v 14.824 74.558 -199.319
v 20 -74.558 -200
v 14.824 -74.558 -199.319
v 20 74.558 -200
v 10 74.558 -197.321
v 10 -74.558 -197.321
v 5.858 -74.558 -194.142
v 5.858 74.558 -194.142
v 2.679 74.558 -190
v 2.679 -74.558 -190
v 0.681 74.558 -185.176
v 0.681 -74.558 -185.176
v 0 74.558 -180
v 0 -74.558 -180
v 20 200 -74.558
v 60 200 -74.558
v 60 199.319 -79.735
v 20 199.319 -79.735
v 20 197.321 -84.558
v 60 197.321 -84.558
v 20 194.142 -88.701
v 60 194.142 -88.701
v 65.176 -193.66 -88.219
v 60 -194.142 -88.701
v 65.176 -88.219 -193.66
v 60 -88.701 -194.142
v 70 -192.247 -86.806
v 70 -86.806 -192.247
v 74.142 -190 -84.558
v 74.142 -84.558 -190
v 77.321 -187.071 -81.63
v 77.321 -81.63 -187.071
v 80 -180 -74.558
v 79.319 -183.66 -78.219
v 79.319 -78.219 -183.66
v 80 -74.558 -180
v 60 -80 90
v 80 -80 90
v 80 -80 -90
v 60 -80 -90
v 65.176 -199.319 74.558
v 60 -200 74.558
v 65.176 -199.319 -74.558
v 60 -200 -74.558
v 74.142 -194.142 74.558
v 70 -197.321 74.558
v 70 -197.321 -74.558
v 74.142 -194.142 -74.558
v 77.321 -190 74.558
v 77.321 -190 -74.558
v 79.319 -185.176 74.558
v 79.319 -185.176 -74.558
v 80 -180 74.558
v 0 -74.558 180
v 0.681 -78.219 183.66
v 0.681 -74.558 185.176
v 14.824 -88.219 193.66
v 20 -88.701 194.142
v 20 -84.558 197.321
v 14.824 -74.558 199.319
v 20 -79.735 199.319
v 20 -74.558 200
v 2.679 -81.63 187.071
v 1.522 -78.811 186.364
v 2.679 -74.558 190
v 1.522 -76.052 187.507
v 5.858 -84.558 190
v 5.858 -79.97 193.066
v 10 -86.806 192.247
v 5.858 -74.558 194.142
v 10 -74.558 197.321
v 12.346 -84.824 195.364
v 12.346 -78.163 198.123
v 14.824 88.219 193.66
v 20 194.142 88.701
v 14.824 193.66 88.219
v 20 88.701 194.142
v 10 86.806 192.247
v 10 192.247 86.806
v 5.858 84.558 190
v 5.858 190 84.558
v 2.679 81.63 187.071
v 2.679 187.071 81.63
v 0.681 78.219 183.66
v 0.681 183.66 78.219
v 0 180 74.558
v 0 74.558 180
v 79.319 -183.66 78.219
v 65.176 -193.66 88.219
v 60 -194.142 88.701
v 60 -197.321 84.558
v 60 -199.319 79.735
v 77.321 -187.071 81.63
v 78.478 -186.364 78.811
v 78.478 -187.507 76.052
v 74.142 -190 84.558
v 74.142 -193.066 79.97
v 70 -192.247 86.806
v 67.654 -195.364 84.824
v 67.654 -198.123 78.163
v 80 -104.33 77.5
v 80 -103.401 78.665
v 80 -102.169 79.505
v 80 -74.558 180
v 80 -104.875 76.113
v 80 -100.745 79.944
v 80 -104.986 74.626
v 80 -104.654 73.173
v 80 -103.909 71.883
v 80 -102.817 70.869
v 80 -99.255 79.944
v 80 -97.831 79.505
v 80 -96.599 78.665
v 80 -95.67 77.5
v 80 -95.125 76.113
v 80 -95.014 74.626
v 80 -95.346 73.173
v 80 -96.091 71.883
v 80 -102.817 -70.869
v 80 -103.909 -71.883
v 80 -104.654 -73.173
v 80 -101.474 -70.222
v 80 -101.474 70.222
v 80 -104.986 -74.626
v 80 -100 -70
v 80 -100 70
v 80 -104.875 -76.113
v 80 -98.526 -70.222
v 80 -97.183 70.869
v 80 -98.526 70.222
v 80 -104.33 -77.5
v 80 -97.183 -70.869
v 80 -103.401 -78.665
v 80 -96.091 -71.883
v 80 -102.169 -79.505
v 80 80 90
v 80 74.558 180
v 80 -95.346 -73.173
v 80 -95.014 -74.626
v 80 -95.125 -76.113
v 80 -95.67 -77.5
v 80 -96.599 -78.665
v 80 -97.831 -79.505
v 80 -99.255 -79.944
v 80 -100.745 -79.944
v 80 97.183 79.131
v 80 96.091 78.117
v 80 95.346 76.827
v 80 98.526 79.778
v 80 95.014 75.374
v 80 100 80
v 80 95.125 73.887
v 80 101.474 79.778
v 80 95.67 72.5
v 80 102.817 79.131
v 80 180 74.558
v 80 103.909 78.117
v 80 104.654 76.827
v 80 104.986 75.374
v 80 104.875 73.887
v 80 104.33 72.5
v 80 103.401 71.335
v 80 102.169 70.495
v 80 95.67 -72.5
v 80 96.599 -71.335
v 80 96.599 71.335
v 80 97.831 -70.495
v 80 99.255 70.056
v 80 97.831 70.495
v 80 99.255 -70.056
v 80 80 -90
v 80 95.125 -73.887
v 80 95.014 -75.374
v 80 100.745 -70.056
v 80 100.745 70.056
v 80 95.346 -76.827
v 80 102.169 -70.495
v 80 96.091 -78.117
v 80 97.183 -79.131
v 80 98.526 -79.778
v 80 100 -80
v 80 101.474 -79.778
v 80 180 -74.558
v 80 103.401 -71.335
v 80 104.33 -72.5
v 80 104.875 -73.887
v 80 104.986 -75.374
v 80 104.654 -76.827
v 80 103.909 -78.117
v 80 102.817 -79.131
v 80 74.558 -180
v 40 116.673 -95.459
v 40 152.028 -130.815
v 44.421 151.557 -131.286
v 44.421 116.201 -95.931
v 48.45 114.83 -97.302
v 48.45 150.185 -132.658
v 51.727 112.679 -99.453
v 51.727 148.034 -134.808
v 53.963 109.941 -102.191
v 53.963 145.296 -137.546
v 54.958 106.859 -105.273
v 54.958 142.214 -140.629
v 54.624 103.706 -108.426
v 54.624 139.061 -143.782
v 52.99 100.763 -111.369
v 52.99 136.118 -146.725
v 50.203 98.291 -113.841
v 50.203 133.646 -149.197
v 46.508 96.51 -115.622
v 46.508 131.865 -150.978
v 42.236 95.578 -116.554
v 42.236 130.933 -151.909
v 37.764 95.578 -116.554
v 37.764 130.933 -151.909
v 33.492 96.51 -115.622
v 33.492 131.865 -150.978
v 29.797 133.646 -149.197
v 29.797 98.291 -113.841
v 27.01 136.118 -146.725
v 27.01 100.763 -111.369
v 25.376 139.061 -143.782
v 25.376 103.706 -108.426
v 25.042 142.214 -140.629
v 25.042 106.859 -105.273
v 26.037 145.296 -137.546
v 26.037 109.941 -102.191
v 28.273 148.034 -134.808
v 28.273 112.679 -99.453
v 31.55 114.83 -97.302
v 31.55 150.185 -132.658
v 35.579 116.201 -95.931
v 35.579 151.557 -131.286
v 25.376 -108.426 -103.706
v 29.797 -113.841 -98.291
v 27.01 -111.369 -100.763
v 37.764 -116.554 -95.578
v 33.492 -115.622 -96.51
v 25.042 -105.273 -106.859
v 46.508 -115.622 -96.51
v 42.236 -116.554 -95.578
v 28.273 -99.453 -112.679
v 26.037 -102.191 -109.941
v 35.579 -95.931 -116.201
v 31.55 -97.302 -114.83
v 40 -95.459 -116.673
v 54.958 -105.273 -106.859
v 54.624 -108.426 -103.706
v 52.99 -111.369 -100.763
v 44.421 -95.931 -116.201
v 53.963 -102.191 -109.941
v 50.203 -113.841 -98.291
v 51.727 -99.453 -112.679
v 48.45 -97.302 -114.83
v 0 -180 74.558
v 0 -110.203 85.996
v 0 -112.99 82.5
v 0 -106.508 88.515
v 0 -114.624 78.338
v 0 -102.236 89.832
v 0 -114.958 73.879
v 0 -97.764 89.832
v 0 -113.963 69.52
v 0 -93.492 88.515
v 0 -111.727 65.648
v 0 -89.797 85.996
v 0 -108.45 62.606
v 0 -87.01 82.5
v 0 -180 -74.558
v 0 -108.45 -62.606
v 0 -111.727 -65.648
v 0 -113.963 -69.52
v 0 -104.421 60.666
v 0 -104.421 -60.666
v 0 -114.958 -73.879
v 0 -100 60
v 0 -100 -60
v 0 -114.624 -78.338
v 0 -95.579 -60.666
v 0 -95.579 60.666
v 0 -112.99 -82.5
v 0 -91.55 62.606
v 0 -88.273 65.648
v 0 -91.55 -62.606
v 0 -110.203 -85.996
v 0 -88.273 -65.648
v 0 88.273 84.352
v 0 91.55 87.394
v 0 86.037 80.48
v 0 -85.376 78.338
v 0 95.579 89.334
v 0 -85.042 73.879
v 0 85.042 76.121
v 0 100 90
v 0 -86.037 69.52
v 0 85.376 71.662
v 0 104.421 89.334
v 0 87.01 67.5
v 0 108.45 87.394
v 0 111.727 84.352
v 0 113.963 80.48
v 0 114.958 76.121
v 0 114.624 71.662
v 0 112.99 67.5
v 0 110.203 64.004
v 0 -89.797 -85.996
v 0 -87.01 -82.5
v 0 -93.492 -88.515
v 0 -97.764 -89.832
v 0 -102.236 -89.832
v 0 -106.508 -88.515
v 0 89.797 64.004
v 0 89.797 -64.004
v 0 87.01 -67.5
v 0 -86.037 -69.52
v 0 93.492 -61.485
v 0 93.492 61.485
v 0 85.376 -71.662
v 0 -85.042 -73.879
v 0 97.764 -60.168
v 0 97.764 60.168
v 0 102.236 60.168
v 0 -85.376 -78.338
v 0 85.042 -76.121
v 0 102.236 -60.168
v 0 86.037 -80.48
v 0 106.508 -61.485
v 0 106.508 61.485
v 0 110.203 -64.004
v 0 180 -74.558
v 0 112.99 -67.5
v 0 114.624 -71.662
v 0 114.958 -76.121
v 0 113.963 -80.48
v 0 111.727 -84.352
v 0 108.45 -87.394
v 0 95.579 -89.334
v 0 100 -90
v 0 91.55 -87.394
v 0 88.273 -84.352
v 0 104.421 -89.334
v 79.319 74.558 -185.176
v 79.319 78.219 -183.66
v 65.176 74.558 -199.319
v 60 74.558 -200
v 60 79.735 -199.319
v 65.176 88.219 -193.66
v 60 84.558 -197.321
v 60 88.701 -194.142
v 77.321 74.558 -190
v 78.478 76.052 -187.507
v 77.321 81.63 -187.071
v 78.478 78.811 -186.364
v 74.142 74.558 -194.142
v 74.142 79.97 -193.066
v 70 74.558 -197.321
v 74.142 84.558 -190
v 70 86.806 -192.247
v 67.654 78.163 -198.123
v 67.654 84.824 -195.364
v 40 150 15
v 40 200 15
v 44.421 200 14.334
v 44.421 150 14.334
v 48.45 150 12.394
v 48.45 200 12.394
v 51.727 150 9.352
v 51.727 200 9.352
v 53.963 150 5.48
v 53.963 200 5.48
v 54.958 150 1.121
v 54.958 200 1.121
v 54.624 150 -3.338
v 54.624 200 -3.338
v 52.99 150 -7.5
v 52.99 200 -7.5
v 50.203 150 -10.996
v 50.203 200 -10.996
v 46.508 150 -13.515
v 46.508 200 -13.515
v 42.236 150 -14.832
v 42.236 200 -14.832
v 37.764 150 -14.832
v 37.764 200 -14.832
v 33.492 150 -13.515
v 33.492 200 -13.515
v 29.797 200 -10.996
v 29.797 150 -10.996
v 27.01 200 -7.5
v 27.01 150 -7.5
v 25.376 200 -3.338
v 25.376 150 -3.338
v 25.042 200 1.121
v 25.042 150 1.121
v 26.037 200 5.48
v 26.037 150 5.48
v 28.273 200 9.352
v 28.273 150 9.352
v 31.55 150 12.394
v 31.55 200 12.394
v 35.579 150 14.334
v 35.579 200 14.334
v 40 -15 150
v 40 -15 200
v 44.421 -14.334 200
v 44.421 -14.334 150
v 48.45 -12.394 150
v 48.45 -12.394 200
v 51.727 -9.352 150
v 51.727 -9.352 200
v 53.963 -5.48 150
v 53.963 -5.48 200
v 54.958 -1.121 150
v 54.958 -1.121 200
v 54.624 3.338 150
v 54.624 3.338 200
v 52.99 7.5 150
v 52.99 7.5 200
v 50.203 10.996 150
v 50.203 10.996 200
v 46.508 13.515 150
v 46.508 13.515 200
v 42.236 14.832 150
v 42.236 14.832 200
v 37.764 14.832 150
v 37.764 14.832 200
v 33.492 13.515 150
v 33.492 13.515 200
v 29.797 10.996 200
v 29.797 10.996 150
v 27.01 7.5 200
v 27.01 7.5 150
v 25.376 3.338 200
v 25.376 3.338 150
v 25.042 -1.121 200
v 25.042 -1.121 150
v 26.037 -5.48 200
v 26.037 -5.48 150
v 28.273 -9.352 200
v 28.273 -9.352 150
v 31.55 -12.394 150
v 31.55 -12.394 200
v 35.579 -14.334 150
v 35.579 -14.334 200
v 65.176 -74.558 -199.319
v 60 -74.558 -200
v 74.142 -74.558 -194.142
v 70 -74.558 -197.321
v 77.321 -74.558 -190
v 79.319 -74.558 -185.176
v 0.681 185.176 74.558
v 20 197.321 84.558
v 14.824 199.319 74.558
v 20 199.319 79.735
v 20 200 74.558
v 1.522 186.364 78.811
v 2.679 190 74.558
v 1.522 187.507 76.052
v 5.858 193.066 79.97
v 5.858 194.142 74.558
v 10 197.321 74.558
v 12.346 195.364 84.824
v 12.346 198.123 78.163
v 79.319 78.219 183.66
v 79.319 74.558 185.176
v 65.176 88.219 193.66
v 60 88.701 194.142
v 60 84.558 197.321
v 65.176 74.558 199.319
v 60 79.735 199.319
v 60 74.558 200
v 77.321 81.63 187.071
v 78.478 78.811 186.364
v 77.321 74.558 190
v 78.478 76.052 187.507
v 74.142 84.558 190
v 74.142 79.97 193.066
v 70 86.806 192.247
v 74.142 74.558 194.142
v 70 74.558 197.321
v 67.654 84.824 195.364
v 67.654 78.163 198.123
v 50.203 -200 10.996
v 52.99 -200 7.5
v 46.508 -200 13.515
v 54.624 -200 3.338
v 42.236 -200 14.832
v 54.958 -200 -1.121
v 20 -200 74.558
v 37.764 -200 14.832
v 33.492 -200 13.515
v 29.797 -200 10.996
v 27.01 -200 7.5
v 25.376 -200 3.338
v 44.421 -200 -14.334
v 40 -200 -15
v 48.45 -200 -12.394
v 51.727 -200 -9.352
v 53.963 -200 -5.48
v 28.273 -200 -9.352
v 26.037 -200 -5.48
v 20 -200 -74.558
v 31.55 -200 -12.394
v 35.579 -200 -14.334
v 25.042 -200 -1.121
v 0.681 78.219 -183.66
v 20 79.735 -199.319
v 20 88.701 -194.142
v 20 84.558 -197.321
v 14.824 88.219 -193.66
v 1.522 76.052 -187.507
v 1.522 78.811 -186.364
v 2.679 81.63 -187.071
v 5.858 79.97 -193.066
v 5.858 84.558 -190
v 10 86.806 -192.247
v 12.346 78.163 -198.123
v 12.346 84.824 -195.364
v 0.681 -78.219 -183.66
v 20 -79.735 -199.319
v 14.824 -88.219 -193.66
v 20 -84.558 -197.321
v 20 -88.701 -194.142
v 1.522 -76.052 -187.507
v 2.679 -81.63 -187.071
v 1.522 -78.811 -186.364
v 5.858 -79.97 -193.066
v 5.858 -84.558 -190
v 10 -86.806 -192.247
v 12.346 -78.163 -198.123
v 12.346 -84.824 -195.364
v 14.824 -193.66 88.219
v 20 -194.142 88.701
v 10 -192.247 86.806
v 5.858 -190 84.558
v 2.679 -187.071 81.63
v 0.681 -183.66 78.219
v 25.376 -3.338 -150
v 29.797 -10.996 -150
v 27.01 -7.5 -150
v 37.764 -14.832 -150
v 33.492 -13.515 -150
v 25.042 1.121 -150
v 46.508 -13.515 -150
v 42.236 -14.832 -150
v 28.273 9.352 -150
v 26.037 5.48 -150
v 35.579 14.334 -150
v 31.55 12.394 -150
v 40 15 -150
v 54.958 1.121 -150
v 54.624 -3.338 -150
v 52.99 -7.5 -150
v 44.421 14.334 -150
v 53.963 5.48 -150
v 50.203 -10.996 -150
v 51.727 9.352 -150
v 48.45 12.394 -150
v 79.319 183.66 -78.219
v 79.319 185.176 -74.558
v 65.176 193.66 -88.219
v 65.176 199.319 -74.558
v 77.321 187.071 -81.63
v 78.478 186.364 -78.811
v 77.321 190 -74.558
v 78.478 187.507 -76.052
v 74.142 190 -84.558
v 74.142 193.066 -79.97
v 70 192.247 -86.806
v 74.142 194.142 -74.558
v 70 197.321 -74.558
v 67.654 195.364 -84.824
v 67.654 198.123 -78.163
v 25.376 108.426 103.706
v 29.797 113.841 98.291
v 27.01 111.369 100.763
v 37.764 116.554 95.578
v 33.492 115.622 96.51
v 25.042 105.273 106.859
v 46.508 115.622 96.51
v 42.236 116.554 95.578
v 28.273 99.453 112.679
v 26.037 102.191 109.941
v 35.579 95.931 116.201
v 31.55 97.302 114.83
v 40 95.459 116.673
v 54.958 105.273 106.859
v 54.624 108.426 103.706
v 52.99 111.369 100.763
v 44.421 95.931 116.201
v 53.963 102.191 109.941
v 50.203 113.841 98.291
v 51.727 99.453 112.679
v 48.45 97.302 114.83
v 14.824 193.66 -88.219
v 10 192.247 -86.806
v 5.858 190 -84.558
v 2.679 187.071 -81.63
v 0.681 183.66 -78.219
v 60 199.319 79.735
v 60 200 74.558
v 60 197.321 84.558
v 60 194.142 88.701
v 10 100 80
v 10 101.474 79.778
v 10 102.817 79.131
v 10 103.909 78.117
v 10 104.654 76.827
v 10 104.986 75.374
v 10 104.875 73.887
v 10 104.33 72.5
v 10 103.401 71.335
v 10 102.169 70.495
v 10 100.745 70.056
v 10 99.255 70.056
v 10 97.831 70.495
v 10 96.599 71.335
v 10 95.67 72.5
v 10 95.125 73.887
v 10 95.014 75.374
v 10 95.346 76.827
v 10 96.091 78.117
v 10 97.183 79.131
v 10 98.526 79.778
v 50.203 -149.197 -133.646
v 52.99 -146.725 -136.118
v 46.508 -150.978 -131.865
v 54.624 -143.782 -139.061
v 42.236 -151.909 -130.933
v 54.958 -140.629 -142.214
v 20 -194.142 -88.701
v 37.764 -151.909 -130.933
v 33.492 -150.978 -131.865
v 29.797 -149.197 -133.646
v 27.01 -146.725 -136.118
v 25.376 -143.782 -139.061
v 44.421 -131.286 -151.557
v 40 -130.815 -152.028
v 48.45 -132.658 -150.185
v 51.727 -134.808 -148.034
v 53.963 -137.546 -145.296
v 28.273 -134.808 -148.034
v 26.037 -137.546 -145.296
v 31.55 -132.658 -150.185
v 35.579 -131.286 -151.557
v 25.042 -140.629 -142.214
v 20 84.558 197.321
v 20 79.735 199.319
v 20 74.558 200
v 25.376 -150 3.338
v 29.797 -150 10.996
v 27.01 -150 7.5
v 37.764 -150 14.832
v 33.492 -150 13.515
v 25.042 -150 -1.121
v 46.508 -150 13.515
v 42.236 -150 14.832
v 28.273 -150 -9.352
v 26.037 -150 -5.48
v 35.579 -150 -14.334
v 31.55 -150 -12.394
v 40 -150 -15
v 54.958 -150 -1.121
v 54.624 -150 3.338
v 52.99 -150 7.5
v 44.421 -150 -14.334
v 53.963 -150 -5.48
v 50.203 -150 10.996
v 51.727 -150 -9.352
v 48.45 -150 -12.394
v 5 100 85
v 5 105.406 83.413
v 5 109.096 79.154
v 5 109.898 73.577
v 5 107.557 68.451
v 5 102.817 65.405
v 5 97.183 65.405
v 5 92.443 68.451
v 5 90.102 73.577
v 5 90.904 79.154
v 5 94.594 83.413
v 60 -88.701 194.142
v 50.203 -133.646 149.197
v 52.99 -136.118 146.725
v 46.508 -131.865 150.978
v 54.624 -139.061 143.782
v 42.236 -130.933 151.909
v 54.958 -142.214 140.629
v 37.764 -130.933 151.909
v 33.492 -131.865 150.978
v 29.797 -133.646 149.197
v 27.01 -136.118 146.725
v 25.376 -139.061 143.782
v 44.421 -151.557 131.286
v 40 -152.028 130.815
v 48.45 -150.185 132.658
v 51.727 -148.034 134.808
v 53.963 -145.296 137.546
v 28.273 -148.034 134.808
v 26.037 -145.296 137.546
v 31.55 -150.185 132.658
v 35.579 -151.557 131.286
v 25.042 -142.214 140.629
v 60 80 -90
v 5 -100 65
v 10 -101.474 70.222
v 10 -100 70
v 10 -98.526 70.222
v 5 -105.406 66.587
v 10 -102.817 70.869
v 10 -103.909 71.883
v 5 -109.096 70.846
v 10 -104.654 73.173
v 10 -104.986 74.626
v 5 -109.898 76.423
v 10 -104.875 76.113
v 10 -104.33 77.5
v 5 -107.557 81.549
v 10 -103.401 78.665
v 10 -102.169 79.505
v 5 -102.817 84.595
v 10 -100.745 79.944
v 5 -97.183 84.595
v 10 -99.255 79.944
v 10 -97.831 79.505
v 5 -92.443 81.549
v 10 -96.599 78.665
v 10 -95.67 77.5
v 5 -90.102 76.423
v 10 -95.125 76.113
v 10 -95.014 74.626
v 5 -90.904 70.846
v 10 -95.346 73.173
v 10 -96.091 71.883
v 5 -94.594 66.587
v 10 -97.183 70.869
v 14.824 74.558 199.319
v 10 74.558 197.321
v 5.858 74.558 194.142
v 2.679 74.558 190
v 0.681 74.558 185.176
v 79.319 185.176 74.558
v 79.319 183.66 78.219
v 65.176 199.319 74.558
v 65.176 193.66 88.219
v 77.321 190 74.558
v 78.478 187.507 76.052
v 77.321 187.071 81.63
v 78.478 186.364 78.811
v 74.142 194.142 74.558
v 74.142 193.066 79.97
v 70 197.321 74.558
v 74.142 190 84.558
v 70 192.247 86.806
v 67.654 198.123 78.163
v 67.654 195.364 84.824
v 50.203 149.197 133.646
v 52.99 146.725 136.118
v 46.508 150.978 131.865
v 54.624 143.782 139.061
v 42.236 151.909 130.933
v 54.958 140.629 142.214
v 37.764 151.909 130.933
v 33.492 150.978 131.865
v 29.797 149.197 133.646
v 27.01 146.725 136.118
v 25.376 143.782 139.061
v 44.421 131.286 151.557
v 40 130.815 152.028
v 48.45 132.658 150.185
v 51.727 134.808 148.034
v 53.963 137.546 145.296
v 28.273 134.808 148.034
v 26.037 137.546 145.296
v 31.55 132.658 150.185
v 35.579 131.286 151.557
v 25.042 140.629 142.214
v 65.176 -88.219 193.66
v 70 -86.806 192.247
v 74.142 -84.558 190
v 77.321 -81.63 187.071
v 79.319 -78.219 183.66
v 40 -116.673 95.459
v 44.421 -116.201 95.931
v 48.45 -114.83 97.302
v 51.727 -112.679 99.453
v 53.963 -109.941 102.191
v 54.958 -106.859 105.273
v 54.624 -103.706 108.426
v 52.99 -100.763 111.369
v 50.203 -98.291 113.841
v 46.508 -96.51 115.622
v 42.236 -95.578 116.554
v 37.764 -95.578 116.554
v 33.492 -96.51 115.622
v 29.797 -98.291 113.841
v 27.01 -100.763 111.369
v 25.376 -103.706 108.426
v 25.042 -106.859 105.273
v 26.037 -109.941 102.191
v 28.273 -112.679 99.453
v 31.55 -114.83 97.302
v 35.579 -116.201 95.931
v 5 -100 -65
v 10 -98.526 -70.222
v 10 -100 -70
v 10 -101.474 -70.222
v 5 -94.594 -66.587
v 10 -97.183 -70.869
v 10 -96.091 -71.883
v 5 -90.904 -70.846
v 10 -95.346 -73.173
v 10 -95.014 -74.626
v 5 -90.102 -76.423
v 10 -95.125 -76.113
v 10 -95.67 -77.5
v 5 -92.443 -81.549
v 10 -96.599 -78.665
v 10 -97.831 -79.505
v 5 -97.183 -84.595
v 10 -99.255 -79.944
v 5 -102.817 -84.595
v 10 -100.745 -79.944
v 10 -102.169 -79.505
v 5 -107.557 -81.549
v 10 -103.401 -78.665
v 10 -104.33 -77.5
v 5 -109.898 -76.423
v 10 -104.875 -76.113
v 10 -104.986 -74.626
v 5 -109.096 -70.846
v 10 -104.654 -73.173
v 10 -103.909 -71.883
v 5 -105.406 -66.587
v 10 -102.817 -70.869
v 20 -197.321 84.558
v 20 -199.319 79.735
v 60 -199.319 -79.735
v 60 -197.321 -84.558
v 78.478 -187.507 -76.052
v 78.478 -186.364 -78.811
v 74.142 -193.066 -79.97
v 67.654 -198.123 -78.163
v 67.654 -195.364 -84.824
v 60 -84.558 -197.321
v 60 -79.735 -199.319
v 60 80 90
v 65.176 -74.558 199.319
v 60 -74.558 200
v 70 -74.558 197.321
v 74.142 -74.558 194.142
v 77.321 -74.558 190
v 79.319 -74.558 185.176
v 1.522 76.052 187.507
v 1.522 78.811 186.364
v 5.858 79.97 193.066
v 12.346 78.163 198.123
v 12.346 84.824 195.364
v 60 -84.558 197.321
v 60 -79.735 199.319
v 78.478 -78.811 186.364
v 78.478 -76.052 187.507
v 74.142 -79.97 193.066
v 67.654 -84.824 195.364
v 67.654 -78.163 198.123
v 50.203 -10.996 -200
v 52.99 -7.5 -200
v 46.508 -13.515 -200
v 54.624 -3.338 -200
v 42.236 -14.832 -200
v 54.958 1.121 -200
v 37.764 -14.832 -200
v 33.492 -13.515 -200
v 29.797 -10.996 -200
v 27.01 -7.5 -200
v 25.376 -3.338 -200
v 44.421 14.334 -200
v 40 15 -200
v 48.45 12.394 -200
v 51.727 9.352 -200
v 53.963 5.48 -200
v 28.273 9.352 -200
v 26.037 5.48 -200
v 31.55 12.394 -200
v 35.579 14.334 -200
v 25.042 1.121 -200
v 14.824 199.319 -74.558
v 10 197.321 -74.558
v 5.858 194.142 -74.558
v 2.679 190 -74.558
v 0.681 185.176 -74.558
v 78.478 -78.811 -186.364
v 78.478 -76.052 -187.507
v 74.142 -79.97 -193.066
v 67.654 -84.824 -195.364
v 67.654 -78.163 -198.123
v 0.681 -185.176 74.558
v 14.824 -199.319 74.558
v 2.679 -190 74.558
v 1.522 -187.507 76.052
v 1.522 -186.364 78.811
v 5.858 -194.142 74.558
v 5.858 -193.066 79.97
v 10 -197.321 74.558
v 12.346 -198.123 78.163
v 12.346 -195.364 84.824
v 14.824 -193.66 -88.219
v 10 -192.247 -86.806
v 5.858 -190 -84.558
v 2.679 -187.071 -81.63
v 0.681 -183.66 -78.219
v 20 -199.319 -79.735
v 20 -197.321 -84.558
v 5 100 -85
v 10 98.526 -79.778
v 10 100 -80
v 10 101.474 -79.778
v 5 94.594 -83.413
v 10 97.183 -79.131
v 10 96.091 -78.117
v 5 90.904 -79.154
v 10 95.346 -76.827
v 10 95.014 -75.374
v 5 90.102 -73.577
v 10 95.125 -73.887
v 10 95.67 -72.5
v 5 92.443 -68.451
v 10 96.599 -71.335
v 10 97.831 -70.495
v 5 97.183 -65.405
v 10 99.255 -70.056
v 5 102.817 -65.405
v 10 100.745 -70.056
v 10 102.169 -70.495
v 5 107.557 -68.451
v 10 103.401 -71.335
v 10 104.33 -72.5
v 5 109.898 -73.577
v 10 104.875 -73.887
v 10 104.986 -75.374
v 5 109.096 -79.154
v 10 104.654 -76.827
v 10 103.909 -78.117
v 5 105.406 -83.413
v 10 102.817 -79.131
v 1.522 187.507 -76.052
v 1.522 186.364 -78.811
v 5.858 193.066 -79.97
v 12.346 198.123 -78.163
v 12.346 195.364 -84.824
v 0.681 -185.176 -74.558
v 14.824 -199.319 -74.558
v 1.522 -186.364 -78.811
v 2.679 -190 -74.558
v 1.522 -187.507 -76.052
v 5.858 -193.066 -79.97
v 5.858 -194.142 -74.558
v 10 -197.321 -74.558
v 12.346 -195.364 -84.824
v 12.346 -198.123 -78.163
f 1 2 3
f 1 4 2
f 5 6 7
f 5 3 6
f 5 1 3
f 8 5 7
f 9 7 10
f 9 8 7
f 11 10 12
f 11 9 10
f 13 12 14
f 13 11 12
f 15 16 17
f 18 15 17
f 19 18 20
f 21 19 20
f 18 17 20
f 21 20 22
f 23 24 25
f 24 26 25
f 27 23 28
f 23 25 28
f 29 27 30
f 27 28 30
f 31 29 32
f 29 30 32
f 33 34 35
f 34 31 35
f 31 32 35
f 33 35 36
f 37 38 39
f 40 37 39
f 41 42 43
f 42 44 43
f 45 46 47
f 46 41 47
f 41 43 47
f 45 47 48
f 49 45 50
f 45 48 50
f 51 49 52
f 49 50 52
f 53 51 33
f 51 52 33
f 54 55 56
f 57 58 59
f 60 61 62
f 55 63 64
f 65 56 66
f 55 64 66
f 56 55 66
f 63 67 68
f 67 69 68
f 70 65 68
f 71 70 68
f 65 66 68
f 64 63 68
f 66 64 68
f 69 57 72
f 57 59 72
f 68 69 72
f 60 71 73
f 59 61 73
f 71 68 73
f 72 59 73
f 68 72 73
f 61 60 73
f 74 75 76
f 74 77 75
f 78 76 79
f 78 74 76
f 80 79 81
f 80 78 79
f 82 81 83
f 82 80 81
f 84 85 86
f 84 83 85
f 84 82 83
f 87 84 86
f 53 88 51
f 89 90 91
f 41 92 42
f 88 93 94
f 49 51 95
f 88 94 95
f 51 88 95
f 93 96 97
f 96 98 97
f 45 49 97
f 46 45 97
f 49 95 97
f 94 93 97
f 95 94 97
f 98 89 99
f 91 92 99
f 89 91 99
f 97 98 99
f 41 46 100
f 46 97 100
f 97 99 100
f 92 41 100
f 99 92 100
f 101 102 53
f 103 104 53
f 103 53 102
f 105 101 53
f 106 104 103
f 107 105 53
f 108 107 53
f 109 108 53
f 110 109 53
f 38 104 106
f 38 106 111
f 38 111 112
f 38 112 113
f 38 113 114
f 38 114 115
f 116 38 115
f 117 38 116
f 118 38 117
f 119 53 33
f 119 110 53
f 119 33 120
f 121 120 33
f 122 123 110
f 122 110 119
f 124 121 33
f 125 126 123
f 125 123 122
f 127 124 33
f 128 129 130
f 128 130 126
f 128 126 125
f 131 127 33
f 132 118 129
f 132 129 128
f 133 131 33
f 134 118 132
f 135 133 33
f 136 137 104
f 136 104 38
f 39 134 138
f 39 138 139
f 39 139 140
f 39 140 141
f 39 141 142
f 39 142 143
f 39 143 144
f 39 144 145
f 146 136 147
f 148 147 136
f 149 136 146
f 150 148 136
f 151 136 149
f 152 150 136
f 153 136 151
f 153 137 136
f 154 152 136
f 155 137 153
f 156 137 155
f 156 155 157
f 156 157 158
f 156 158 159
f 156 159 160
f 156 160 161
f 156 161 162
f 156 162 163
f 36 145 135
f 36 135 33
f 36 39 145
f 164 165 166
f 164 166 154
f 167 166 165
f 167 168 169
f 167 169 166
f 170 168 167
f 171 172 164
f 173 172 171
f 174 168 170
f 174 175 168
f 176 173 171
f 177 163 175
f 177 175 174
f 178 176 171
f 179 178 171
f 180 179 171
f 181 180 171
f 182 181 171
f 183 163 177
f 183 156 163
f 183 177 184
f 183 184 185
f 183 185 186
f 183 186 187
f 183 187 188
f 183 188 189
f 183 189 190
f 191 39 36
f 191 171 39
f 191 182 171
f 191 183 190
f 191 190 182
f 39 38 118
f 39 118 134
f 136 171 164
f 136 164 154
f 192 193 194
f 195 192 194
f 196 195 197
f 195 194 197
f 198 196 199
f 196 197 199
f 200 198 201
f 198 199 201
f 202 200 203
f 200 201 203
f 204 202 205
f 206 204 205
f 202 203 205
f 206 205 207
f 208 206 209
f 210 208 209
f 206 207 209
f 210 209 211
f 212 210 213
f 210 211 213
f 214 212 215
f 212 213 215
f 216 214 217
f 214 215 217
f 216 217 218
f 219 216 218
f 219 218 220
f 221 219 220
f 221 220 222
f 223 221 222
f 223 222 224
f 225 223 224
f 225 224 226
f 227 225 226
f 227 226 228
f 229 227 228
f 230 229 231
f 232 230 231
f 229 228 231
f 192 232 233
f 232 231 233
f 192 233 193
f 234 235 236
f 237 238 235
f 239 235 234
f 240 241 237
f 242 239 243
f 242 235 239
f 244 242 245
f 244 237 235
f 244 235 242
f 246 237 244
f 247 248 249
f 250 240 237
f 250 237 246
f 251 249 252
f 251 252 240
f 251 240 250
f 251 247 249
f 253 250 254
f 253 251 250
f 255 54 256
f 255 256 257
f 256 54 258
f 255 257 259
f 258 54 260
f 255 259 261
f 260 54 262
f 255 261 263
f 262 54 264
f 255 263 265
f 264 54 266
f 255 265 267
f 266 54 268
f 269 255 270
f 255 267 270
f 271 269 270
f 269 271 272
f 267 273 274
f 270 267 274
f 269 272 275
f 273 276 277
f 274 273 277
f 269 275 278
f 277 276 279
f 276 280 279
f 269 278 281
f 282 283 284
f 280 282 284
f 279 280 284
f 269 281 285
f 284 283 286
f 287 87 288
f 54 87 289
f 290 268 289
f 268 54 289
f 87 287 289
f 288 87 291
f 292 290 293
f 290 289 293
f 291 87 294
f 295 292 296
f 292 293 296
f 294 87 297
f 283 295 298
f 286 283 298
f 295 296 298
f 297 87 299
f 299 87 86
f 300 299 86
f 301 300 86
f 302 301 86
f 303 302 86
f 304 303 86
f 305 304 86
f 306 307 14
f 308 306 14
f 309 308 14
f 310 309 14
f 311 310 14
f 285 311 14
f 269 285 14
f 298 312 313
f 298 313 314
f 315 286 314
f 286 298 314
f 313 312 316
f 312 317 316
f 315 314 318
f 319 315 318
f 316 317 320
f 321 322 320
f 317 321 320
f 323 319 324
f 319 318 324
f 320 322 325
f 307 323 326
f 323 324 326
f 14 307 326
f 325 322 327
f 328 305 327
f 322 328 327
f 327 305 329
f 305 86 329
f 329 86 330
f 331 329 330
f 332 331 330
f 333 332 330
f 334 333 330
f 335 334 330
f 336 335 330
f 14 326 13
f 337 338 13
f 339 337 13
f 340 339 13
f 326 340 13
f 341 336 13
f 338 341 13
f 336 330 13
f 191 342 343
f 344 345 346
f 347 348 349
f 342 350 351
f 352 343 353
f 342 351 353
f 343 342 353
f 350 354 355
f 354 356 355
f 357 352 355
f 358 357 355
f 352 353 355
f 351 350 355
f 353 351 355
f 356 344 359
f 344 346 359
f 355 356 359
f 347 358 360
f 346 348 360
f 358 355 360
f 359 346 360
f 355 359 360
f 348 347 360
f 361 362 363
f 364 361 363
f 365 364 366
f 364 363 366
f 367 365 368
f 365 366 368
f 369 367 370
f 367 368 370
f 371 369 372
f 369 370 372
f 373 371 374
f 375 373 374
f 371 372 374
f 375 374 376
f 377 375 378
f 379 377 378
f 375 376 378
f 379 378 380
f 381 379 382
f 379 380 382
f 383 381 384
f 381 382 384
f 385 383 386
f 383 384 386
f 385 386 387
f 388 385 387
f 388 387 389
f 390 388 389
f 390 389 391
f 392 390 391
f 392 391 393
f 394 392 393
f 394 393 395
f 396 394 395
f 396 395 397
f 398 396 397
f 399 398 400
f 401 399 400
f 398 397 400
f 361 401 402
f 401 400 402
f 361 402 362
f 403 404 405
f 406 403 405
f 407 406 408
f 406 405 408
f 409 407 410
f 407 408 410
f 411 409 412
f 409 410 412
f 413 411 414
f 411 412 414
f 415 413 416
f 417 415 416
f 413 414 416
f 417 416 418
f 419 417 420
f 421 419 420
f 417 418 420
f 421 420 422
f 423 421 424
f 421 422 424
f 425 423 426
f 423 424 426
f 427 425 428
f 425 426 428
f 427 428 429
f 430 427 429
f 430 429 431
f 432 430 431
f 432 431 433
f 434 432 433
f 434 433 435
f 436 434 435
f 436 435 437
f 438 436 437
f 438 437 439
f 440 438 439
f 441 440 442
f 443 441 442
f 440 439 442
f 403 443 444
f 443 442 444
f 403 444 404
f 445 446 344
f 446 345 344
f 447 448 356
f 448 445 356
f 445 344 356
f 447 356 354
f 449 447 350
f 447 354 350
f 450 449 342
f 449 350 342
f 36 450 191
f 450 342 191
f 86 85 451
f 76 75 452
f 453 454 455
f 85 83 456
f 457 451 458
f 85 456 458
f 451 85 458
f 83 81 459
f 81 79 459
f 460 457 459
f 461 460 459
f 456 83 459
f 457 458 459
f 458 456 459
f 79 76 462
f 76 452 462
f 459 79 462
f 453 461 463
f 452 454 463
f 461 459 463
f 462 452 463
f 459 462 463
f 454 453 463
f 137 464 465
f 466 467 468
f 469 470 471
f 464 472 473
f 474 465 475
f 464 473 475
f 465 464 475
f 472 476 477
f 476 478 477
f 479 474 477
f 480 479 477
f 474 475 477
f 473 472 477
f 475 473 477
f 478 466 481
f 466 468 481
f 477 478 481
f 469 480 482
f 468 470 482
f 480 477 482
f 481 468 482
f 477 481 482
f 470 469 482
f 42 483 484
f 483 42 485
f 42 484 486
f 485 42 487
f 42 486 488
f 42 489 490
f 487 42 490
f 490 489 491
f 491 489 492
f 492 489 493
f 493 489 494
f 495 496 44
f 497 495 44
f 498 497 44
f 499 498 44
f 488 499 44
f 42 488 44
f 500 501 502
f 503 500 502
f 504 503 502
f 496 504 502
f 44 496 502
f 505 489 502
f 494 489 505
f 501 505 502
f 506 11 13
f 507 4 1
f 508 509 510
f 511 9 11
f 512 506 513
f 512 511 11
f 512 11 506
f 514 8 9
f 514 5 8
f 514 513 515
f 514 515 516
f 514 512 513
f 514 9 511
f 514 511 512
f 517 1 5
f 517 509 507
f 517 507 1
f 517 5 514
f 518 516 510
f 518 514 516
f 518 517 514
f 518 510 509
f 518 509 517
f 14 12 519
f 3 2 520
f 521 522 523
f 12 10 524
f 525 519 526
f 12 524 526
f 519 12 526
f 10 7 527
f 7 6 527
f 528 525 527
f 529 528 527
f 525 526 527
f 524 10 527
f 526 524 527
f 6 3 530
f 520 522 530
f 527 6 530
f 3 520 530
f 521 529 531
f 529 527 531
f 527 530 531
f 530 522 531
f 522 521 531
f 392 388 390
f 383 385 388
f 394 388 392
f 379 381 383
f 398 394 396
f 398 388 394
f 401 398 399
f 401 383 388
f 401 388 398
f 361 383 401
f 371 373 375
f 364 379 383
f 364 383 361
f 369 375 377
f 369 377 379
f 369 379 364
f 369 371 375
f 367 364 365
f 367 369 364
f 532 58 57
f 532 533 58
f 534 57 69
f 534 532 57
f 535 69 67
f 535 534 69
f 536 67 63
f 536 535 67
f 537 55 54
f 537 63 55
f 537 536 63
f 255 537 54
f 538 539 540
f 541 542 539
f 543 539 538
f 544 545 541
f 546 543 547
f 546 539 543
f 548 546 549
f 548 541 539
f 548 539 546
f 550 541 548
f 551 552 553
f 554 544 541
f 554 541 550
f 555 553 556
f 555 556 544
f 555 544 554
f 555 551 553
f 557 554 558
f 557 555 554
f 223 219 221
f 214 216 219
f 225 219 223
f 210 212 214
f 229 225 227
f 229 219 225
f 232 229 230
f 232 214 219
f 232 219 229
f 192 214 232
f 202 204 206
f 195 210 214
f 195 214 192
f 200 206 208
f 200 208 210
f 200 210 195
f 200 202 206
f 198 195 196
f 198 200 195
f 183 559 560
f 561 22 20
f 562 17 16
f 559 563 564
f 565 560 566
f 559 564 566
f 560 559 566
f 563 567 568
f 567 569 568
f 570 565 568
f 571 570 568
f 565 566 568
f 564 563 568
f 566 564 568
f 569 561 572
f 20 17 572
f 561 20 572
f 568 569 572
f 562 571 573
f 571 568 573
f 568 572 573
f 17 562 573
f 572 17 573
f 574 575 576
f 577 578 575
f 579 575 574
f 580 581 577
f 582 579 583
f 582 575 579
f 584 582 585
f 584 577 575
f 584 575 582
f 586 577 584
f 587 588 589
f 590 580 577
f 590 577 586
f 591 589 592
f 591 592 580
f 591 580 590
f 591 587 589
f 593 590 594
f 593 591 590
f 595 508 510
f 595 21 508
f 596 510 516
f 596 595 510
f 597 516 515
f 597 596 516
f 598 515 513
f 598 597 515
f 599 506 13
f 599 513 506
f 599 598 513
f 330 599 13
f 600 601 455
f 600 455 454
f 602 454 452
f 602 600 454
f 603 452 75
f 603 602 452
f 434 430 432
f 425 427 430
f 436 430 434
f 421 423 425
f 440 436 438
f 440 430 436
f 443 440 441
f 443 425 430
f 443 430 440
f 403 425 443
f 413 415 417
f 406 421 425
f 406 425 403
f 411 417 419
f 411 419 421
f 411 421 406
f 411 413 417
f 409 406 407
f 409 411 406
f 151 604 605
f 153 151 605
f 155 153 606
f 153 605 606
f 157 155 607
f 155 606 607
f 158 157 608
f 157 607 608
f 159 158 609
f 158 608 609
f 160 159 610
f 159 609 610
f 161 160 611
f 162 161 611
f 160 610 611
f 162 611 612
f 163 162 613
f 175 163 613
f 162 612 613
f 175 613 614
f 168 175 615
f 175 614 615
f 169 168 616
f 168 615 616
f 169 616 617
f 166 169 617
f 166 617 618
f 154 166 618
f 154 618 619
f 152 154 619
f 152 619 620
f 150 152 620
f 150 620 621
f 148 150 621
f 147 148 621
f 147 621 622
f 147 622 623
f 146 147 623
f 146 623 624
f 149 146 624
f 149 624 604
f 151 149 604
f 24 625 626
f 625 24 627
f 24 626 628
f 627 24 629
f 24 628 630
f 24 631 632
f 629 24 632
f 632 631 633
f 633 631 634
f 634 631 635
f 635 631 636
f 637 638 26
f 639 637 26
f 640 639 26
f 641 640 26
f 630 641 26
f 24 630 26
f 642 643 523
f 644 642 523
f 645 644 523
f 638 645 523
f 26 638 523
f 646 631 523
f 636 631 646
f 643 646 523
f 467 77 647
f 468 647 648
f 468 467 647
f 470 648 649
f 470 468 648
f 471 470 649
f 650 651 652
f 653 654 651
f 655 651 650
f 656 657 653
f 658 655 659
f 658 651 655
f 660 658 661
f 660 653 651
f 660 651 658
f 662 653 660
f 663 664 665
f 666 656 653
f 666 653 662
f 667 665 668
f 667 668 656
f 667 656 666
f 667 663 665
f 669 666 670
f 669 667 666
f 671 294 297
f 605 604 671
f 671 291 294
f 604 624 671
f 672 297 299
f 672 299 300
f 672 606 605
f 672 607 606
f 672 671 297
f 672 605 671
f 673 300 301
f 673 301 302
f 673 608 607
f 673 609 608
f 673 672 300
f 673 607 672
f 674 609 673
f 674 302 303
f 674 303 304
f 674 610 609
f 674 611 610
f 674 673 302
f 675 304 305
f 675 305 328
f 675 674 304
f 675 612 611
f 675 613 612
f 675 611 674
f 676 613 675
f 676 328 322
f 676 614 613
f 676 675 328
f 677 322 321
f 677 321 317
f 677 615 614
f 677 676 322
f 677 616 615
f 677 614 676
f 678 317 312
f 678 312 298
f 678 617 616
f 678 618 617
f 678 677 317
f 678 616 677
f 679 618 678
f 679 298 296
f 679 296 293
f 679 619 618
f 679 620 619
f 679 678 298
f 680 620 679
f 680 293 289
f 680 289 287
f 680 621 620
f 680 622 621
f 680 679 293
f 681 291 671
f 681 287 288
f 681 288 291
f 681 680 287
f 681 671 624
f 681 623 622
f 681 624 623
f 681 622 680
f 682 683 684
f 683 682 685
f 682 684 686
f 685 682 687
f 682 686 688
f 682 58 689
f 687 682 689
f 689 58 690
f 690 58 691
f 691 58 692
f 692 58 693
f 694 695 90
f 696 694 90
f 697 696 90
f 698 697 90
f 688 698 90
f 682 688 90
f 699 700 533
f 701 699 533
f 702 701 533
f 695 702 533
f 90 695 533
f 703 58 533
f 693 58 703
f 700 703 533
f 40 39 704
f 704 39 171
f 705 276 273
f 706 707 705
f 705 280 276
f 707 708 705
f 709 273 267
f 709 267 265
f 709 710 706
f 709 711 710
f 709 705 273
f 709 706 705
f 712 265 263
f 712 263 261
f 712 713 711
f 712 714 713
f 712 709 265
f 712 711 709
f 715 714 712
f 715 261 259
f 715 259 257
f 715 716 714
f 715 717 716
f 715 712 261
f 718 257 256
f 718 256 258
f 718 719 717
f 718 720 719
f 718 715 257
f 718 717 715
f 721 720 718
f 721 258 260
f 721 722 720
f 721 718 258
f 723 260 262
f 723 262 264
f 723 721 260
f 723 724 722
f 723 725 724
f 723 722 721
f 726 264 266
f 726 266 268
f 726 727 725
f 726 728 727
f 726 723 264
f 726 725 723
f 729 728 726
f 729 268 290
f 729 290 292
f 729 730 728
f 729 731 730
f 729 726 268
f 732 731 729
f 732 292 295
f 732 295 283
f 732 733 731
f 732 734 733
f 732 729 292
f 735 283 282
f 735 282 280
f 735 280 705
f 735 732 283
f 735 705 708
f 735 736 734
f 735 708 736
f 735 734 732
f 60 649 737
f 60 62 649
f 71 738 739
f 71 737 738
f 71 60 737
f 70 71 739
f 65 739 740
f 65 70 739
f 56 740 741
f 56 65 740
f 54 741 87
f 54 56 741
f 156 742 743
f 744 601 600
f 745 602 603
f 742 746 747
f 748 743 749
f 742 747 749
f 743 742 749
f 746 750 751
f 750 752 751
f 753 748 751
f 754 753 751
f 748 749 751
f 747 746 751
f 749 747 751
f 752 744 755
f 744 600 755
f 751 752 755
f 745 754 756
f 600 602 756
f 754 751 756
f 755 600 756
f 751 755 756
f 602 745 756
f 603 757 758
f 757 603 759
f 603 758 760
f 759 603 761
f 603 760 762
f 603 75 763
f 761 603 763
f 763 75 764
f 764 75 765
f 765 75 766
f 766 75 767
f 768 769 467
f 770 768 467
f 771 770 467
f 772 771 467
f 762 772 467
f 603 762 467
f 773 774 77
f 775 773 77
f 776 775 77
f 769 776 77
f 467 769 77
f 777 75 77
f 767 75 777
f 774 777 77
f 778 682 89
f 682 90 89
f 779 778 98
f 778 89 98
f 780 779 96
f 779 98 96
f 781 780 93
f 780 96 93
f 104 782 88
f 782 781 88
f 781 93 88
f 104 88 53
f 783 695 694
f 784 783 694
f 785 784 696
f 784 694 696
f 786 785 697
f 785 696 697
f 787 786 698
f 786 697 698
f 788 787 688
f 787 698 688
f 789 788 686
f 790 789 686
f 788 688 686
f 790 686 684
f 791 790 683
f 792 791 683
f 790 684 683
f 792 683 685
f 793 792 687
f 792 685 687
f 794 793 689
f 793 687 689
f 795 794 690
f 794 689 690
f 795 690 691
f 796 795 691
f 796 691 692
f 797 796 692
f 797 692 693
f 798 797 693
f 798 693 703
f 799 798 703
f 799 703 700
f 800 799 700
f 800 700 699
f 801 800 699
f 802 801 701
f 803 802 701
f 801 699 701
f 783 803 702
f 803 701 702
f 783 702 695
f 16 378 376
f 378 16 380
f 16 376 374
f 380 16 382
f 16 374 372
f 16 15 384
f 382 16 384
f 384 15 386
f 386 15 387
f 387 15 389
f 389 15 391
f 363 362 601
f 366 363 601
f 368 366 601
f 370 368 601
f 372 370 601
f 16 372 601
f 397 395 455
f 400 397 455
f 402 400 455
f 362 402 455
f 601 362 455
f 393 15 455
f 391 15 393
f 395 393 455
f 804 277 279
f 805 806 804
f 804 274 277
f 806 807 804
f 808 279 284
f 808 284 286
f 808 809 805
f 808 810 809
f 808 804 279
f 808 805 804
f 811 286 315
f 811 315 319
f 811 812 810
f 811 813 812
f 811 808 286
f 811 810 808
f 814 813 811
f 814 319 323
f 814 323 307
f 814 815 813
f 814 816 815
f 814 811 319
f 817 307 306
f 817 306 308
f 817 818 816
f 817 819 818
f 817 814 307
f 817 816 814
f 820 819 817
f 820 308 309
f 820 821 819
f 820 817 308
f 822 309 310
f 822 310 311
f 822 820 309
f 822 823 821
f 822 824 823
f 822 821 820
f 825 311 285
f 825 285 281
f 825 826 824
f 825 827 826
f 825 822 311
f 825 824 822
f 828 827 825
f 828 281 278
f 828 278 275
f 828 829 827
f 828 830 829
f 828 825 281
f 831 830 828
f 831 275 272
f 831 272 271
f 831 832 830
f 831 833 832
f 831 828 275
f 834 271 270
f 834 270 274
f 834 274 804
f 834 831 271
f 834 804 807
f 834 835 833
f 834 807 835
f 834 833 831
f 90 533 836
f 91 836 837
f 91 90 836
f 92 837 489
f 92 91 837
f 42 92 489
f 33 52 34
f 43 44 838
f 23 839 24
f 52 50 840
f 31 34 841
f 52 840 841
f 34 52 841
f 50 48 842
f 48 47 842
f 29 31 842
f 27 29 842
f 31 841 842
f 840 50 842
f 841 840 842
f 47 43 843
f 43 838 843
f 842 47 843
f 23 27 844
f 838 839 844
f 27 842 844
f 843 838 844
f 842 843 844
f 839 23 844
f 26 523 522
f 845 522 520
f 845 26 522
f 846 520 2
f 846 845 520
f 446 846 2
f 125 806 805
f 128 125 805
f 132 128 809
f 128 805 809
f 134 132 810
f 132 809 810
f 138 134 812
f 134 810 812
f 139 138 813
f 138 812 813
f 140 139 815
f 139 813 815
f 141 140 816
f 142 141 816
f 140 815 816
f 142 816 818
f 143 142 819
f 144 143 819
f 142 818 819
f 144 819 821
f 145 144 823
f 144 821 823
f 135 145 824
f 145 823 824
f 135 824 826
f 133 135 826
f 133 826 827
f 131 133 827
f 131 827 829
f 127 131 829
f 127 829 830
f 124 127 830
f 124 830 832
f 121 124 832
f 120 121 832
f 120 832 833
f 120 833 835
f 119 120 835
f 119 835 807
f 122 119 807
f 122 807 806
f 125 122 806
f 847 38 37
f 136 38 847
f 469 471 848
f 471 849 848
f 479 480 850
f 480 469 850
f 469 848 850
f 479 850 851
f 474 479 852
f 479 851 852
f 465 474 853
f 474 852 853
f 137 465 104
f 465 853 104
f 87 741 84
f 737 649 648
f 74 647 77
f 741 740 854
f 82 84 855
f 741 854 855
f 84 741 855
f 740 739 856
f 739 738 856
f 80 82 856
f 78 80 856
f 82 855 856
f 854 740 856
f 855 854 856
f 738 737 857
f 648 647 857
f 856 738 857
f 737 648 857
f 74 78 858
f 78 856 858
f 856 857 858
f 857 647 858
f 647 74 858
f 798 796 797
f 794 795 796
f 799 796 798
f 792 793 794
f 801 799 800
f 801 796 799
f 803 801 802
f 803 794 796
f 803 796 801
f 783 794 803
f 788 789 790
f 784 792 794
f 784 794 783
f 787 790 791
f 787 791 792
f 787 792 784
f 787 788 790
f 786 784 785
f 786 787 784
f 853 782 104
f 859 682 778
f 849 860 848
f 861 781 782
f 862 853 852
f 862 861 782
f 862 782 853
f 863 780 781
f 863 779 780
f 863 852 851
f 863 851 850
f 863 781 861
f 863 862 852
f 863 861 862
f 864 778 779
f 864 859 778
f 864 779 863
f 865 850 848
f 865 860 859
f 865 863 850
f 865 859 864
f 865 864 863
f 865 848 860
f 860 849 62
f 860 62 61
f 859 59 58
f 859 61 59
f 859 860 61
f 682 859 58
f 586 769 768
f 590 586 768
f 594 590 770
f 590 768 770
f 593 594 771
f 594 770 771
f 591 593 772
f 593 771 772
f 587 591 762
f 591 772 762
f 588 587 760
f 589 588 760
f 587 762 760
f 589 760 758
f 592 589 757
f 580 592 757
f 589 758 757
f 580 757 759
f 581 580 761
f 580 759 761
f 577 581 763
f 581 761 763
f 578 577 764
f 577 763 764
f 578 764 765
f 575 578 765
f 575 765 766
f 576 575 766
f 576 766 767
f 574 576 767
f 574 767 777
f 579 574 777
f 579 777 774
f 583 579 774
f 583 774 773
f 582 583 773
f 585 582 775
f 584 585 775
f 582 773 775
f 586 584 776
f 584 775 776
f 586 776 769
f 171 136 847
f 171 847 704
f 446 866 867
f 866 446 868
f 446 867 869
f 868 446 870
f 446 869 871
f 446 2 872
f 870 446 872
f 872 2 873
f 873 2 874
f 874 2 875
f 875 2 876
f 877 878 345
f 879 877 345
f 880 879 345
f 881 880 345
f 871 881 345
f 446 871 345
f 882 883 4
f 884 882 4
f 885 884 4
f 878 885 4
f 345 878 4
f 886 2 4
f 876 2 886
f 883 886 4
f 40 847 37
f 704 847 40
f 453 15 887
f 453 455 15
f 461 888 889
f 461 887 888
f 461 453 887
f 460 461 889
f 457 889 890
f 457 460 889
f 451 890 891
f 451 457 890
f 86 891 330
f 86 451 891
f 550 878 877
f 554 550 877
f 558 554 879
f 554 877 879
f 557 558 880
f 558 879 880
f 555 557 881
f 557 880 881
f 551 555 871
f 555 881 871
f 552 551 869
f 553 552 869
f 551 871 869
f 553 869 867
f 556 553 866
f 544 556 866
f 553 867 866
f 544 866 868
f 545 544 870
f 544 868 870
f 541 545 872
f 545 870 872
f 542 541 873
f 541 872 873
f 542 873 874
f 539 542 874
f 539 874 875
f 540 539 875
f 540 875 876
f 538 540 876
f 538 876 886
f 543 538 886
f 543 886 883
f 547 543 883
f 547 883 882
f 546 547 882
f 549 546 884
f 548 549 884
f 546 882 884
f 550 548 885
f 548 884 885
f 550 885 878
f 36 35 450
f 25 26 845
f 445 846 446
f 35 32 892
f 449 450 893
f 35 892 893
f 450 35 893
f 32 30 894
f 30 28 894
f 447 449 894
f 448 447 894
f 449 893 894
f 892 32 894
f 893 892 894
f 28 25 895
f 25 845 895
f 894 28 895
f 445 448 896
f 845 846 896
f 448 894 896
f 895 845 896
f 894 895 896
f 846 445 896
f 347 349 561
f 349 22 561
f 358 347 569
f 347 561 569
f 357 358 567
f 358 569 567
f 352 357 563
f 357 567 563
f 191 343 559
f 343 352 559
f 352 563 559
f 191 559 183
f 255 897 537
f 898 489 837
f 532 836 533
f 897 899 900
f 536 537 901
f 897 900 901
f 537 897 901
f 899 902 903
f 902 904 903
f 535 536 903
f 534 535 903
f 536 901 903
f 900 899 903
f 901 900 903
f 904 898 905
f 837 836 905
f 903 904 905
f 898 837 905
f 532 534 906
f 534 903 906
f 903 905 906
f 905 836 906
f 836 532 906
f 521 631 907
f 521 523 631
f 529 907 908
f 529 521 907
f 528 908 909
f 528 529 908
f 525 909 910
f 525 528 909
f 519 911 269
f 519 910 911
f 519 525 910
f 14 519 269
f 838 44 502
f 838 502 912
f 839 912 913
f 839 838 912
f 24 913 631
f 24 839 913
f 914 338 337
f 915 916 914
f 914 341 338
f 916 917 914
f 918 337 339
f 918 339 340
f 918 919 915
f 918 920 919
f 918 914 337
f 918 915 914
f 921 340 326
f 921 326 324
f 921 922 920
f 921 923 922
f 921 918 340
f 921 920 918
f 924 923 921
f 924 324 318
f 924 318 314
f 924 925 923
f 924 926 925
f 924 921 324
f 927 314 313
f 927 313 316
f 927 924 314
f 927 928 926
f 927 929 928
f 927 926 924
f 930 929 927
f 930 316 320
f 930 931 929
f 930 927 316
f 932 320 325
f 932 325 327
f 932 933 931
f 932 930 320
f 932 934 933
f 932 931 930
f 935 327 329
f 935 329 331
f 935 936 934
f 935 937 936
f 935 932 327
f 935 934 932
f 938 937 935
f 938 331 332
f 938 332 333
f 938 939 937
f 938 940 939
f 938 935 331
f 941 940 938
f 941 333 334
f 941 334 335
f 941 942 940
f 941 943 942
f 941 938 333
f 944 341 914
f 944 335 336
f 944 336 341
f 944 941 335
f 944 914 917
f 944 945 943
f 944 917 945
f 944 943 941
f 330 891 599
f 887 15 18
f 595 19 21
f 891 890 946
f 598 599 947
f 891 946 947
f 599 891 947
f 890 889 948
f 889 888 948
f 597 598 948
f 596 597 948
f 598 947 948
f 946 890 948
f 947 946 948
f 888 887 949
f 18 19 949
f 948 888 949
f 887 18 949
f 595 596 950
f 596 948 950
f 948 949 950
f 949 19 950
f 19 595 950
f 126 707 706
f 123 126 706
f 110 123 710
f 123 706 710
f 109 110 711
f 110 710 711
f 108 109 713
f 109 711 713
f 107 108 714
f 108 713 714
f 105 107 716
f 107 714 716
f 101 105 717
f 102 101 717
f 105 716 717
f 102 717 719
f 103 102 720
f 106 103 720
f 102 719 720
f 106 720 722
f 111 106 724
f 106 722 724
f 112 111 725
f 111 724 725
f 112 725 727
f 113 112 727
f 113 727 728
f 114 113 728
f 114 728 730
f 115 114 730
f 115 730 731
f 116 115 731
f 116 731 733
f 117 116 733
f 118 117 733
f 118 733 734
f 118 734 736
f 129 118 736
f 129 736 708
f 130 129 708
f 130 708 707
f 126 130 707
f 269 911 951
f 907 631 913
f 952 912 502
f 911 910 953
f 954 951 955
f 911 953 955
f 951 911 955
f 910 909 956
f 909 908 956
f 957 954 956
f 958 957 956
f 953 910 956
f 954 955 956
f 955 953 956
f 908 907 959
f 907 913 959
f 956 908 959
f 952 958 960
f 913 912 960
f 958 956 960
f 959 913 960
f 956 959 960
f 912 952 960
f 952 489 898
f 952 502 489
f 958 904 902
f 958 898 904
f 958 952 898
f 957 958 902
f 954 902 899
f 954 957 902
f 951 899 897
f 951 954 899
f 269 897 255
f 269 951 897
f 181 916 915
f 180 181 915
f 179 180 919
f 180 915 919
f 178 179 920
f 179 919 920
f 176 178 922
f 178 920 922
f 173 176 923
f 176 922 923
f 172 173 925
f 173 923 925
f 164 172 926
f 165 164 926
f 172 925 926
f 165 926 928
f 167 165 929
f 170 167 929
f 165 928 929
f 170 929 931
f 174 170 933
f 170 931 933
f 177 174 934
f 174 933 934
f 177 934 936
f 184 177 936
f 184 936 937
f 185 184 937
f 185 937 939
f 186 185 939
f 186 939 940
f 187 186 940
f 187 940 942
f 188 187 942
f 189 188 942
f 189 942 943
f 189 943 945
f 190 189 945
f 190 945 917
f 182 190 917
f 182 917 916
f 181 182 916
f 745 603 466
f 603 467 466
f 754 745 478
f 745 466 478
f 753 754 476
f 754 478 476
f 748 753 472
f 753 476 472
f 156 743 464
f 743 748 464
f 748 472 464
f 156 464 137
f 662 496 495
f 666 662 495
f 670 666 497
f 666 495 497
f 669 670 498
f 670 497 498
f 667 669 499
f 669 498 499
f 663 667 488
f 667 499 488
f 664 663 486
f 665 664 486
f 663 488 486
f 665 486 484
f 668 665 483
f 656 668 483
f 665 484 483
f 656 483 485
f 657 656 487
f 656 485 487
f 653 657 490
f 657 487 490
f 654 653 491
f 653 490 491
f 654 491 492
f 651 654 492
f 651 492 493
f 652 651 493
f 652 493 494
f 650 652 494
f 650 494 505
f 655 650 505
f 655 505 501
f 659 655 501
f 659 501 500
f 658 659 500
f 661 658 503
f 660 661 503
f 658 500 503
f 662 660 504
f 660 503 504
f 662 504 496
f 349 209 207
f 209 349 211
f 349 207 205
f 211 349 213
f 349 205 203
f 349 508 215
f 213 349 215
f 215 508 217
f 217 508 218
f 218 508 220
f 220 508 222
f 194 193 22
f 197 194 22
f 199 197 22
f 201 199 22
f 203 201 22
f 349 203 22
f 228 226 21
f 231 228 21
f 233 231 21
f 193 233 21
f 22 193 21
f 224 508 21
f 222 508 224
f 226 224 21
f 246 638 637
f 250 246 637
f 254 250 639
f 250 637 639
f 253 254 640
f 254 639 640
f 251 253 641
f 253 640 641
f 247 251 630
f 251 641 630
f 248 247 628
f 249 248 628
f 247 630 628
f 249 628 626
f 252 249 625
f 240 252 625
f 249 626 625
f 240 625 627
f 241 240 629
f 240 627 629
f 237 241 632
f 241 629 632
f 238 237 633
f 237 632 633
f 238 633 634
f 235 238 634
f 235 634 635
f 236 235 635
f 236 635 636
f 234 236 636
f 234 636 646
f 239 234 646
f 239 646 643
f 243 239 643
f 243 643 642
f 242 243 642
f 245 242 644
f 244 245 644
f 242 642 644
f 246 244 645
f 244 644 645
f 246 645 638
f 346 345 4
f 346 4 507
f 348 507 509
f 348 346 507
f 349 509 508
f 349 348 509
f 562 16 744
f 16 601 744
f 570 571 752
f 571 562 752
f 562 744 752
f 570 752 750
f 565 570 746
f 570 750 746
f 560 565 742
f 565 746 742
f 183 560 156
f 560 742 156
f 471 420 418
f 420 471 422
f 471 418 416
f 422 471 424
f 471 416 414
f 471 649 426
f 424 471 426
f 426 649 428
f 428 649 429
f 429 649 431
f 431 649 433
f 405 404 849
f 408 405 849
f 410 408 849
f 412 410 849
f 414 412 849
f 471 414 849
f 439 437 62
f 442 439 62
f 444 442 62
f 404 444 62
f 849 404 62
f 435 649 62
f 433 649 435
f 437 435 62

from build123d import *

# Parameters (mm, degrees)
BOSS_EXTRUDE2_DEPTH = 80
FILLET2_R           = 20
SKETCH5_R           = 15
CUT_EXTRUDE2_DEPTH  = 50
CIRPATTERN3_COUNT   = 8
SKETCH6_R           = 5
CUT_EXTRUDE3_DEPTH  = 294.938769134
SKETCH7_W           = 180
SKETCH7_H           = 160
CUT_EXTRUDE4_DEPTH  = 20
CHAMFER1_SIZE       = 10


with BuildPart() as part:
    # Sketch4 → Boss-Extrude2 (new body)
    with BuildSketch(Plane(origin=(0, 0, 0), x_dir=(0, 0, -1), z_dir=(1, 0, 0))):
        Polygon((82.842712475, 200), (-82.842712475, 200), (-200, 82.842712475), (-200, -82.842712475), (-82.842712475, -200), (82.842712475, -200), (200, -82.842712475), (200, 82.842712475), align=None)
    extrude(amount=BOSS_EXTRUDE2_DEPTH)

    # Fillet2
    fillet2_edges = [part.edges().sort_by_distance(p)[0] for p in [
        (80, 141.421356237, 141.421356237),
        (0, 200, 0),
        (0, 141.421356237, -141.421356237),
        (80, 0, 200),
        (40, 82.842712475, -200),
        (40, -82.842712475, -200),
        (40, -200, -82.842712475),
        (40, -200, 82.842712475),
        (40, -82.842712475, 200),
        (40, 82.842712475, 200),
        (40, 200, 82.842712475),
        (40, 200, -82.842712475),
        (80, -141.421356237, 141.421356237),
        (80, -200, 0),
        (80, -141.421356237, -141.421356237),
        (80, 0, -200),
        (80, 141.421356237, -141.421356237),
        (80, 200, 0),
        (0, 0, -200),
        (0, -141.421356237, -141.421356237),
        (0, -200, 0),
        (0, -141.421356237, 141.421356237),
        (0, 0, 200),
        (0, 141.421356237, 141.421356237),
    ]]
    fillet(fillet2_edges, radius=FILLET2_R)

    # Sketch5 → Cut-Extrude2 (cut)
    with BuildSketch(Plane(origin=(0, -141.421356237, -141.421356237), x_dir=(1, 0, 0), z_dir=(0, -0.7071067811865474, -0.7071067811865477))):
        with Locations(Location((40, 0, 0), (0, 0, 270))):
            Circle(SKETCH5_R)
    cut_extrude2 = extrude(amount=-CUT_EXTRUDE2_DEPTH, mode=Mode.SUBTRACT)

    # CirPattern3: Cut-Extrude2 ×8 about axis
    cirpattern3_axis = Axis((0, 0, 0), (1, 0, 0))
    for i in range(1, CIRPATTERN3_COUNT):
        add(cut_extrude2.rotate(cirpattern3_axis, i * 360 / CIRPATTERN3_COUNT), mode=Mode.SUBTRACT)

    # Sketch6 → Cut-Extrude3 (cut, through all)
    with BuildSketch(Plane.ZY):
        with Locations((75, 100)):
            Circle(SKETCH6_R)
        with Locations(Location((-75, 100, 0), (0, 0, 180))):
            Circle(SKETCH6_R)
        with Locations((-75, -100)):
            Circle(SKETCH6_R)
        with Locations(Location((75, -100, 0), (0, 0, 180))):
            Circle(SKETCH6_R)
    extrude(amount=-CUT_EXTRUDE3_DEPTH, mode=Mode.SUBTRACT)

    # Sketch7 → Cut-Extrude4 (cut)
    with BuildSketch(Plane(origin=(80, 0, 0), x_dir=(0, 0, -1), z_dir=(1, 0, 0))):
        Rectangle(SKETCH7_W, SKETCH7_H)
    extrude(amount=-CUT_EXTRUDE4_DEPTH, mode=Mode.SUBTRACT)

    # Chamfer1
    chamfer1_edges = [part.edges().sort_by_distance(p)[0] for p in [
        (0, -100, 80),
        (0, -100, -80),
        (0, 100, -70),
        (0, 100, 70),
    ]]
    chamfer(chamfer1_edges, length=CHAMFER1_SIZE)


solid = part.part
